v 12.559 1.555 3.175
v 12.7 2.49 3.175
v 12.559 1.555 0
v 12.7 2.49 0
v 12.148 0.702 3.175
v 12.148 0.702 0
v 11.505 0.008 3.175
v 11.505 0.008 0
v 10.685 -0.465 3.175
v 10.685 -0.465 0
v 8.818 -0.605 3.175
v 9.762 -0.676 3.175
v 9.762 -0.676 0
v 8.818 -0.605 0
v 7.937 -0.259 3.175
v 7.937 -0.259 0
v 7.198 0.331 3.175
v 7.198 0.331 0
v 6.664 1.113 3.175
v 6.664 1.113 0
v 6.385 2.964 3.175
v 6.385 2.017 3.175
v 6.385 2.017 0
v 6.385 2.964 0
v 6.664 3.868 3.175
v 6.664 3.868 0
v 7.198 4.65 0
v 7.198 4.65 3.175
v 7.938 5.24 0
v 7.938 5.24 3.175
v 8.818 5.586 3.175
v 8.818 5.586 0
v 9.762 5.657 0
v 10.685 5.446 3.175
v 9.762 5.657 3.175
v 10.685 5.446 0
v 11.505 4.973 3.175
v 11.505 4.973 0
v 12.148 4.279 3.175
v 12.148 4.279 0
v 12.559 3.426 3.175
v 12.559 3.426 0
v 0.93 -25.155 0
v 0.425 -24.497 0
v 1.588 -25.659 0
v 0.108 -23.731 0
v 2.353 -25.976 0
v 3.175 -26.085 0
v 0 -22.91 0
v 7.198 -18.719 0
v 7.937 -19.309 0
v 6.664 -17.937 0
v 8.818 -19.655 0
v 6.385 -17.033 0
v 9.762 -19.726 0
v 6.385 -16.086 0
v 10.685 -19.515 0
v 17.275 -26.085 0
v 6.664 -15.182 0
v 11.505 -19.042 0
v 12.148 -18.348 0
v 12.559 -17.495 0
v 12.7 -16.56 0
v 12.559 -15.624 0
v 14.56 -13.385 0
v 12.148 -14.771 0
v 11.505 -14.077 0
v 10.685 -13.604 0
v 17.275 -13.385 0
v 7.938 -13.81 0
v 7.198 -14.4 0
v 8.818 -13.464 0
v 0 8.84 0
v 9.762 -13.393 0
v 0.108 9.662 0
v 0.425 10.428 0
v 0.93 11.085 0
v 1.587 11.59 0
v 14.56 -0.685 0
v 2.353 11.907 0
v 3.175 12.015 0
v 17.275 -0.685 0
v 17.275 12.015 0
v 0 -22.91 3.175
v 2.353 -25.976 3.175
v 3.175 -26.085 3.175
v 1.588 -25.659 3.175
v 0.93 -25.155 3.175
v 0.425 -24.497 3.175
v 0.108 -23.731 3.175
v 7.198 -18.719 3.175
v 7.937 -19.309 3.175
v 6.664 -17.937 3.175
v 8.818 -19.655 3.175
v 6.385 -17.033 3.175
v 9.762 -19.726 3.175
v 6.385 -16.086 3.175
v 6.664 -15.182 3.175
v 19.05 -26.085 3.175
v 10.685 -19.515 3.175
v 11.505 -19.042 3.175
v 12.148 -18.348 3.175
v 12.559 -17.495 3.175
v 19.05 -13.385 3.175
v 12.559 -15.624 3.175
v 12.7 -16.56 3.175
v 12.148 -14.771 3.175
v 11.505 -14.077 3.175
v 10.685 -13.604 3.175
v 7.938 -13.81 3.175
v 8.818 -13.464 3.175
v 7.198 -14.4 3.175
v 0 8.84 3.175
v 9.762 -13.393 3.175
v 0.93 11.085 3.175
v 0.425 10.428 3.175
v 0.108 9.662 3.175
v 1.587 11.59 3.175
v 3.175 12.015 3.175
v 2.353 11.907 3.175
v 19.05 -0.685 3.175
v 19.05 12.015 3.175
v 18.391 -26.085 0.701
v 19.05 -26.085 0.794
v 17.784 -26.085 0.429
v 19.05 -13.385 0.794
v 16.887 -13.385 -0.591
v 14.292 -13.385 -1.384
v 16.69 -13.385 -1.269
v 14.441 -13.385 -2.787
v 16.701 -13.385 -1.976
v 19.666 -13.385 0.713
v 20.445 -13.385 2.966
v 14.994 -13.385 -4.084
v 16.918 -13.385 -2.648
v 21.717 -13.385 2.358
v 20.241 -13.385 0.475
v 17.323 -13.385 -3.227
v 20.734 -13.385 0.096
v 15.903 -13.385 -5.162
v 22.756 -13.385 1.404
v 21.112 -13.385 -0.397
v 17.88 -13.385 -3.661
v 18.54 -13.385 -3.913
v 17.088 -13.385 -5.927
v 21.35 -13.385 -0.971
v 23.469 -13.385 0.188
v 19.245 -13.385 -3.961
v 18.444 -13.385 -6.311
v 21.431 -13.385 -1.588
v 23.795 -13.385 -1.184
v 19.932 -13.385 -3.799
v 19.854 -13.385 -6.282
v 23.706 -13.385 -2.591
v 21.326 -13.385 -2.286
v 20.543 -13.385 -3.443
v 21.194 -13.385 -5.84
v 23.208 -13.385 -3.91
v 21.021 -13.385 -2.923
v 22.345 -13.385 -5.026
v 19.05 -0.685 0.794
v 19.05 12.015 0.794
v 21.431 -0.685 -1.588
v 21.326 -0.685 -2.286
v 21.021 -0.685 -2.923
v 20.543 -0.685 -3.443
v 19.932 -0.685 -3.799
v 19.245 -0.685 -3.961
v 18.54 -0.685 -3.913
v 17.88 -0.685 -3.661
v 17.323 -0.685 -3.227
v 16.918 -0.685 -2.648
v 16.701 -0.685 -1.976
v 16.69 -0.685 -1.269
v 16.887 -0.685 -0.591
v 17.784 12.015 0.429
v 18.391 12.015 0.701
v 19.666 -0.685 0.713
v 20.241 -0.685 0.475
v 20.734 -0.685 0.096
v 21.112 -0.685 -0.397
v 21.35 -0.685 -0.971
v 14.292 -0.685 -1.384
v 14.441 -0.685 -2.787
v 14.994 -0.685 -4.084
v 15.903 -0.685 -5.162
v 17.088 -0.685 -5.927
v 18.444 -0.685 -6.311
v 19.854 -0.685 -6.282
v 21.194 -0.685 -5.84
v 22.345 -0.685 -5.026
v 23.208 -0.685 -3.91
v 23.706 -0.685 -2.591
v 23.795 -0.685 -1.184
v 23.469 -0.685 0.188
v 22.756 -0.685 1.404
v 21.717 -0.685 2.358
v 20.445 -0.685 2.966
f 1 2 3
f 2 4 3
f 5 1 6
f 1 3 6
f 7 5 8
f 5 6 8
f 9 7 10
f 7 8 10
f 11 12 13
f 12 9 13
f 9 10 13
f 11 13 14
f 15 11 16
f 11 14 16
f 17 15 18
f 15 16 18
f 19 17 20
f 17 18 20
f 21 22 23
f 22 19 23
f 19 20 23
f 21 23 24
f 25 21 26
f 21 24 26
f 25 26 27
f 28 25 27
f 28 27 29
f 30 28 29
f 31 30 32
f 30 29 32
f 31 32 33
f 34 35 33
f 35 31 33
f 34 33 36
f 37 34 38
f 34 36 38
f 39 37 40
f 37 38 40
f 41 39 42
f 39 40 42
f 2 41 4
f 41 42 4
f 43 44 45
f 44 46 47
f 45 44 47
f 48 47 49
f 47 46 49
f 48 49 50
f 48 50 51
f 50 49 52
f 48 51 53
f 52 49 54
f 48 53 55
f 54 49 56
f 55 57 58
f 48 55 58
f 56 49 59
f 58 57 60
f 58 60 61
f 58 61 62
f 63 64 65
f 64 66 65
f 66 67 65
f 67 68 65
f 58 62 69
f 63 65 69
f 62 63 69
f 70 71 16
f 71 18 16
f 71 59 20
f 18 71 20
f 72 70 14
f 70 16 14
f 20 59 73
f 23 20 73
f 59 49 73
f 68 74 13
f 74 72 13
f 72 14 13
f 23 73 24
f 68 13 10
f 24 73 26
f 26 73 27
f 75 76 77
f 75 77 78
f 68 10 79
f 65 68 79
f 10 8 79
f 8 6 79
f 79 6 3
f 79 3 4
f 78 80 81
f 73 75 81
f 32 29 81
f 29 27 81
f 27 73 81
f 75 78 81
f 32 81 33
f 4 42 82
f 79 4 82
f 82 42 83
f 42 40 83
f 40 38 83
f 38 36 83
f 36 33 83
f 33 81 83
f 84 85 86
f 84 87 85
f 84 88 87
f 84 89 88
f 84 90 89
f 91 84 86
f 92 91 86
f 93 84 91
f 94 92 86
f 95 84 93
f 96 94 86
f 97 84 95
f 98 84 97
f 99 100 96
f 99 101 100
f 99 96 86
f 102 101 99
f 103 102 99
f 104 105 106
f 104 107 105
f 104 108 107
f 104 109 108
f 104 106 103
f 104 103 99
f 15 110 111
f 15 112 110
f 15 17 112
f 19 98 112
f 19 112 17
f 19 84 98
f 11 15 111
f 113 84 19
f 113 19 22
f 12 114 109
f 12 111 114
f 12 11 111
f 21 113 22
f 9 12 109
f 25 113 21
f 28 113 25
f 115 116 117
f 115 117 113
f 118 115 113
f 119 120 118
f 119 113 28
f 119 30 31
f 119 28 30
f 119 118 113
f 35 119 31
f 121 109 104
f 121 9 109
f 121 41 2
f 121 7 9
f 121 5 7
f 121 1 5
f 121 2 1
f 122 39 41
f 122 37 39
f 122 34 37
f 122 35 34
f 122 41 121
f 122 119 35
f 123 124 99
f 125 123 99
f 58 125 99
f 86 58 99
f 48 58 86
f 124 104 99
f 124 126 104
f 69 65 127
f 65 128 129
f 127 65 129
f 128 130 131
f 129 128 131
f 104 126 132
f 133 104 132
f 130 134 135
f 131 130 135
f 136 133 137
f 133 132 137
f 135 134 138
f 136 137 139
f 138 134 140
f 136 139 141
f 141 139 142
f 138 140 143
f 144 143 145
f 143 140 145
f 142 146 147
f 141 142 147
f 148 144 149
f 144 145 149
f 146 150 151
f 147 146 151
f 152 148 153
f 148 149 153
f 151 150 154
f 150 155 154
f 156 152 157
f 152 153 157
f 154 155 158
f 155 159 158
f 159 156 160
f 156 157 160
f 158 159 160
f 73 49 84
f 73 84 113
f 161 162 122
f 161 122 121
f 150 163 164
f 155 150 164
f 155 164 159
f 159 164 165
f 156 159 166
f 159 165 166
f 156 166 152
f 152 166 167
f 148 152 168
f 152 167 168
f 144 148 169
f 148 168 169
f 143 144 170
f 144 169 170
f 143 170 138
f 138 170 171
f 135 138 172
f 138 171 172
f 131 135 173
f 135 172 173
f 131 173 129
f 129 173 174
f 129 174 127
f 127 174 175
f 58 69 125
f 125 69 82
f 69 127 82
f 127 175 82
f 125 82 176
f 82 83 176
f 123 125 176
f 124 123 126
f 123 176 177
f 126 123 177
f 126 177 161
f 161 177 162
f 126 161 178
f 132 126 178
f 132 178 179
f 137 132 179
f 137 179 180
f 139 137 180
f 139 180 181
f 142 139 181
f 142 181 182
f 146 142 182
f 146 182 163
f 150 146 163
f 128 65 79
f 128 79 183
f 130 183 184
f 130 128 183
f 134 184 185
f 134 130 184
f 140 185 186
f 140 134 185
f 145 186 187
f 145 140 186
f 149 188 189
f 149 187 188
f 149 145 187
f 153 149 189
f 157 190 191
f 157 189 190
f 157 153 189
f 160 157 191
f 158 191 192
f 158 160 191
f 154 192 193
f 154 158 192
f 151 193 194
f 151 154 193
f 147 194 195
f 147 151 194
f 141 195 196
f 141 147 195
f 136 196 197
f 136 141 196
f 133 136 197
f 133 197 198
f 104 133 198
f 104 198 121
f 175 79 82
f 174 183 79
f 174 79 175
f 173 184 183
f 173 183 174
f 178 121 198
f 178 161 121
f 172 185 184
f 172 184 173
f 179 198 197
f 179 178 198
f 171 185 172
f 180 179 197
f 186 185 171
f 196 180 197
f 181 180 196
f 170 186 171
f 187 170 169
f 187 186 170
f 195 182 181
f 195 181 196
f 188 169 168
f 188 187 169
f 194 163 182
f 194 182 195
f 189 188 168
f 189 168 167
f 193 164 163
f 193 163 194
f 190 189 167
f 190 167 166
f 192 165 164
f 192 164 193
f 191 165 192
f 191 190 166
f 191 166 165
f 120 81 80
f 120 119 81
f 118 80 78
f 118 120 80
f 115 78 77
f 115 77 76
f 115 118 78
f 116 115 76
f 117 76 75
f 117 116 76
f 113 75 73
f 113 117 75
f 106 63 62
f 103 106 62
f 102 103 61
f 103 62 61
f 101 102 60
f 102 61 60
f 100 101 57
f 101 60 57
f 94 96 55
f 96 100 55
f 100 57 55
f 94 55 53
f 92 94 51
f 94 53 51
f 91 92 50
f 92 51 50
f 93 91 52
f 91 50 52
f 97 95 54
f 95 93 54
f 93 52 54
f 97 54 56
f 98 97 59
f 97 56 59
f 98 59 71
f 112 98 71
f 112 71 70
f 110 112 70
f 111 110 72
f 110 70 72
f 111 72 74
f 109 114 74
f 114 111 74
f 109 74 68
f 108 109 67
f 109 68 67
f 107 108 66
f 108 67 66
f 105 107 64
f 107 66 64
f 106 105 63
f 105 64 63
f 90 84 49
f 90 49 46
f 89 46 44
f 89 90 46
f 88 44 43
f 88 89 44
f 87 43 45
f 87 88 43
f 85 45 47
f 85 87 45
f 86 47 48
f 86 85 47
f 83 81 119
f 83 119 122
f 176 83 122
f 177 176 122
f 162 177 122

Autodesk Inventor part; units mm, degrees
ref_plane "YZ Plane" through (0, 0, 0) normal (1, 0, 0) x (0, 1, 0)
ref_plane "XZ Plane" through (0, 0, 0) normal (0, 1, 0) x (-1, 0, 0)
sketch "Sketch1" plane through (0, 0, 0) normal (0, 0, 1) x (1, 0, 0)
  line L0 (0, 12.0154) -> (19.05, 12.0154)
  line L1 (19.05, 12.0154) -> (19.05, -26.0846)
  line L2 (19.05, -26.0846) -> (0, -26.0846)
  line L3 (0, -26.0846) -> (0, 12.0154)
  circle A0 centre (9.525, 2.4904) radius 3.175
  circle A1 centre (9.525, -16.5596) radius 3.175
  point P0 (0, 0)
  dimension "d0" = 19.05
  dimension "d1" = 38.1
  dimension "d2" = 6.35
  dimension "d3" = 6.35
  dimension "d4" = 19.05
  dimension "d5" = 9.525
  dimension "d6" = 9.525
extrude "Extrusion1" add sketch "Sketch1" along normal blind 3.175
fillet "Fillet1" radius 3.175 2 edges at (0, 12.0154, 1.5875) (0, -26.0846, 1.5875)
ref_plane "Work Plane1" through (3.175, -7.0346, 3.175) normal (0, 1, 0) x (1, 0, 0)
sketch "Sketch3" plane through (3.175, -7.0346, 3.175) normal (0, 1, 0) x (1, 0, 0)
  circle A0 centre (15.875, 4.7625) radius 4.7625
  line L0 (0, 3.175) -> (15.875, 3.175) projected
  line L1 (15.875, 0) -> (0, 0) projected
  point P0 (-3.175, 3.175)
  dimension "d21" = 9.525
extrude "Extrusion4" add sketch "Sketch3" along normal mid plane 12.7
sketch "Sketch6" plane through (19.05, 12.0154, 3.175) normal (0, 1, 0) x (1, 0, 0)
  circle A0 centre (0, 4.7625) radius 2.3813
  arc A1 (0, 0) -> (-4.4901, 3.175) centre (0, 4.7625) ccw projected
  point P0 (-19.05, 3.175)
  point P1 (-4.4901, 0)
  point P2 (0, 3.175)
  dimension "d18" = 4.7625
extrude "Extrusion5" cut sketch "Sketch6" against normal blind 38.1
sketch "Sketch8" plane through (0, 0, 0) normal (0, 1, 0) x (-1, 0, 0)
  arc A0 (-19.05, 0.7937) -> (-17.2751, 0) centre (-19.05, -1.5875) ccw projected
  line L0 (-14.5599, 0) -> (-17.2751, 0) projected
  arc A1 (-19.05, 3.175) -> (-14.5599, 0) centre (-19.05, -1.5875) ccw projected
  line L1 (-19.05, 0.7937) -> (-19.05, 3.175) projected
  line L2 (-3.175, 3.175) -> (0, 3.175) projected
  line L3 (0, 3.175) -> (0, 0) projected
  line L4 (0, 0) -> (-3.175, 0) projected
  line L5 (-3.175, 0) -> (-3.175, 3.175) projected
  line L6 (0, 0) -> (-14.2875, 0)
  line L7 (-14.2875, 0) -> (-14.2875, -6.4324)
  line L8 (-14.2875, -6.4324) -> (0, -6.4324)
  line L9 (0, -6.4324) -> (0, 0)
  dimension "d22" = 14.2875
equation "\"d3\" = d2"
equation "\"d4\" = 0.5 * d1"
equation "\"d5\" = 0.25 * d1"
equation "\"d6\" = 0.5 * d0"
properties part number "hinge right" material "Brass, Soft Yellow"
